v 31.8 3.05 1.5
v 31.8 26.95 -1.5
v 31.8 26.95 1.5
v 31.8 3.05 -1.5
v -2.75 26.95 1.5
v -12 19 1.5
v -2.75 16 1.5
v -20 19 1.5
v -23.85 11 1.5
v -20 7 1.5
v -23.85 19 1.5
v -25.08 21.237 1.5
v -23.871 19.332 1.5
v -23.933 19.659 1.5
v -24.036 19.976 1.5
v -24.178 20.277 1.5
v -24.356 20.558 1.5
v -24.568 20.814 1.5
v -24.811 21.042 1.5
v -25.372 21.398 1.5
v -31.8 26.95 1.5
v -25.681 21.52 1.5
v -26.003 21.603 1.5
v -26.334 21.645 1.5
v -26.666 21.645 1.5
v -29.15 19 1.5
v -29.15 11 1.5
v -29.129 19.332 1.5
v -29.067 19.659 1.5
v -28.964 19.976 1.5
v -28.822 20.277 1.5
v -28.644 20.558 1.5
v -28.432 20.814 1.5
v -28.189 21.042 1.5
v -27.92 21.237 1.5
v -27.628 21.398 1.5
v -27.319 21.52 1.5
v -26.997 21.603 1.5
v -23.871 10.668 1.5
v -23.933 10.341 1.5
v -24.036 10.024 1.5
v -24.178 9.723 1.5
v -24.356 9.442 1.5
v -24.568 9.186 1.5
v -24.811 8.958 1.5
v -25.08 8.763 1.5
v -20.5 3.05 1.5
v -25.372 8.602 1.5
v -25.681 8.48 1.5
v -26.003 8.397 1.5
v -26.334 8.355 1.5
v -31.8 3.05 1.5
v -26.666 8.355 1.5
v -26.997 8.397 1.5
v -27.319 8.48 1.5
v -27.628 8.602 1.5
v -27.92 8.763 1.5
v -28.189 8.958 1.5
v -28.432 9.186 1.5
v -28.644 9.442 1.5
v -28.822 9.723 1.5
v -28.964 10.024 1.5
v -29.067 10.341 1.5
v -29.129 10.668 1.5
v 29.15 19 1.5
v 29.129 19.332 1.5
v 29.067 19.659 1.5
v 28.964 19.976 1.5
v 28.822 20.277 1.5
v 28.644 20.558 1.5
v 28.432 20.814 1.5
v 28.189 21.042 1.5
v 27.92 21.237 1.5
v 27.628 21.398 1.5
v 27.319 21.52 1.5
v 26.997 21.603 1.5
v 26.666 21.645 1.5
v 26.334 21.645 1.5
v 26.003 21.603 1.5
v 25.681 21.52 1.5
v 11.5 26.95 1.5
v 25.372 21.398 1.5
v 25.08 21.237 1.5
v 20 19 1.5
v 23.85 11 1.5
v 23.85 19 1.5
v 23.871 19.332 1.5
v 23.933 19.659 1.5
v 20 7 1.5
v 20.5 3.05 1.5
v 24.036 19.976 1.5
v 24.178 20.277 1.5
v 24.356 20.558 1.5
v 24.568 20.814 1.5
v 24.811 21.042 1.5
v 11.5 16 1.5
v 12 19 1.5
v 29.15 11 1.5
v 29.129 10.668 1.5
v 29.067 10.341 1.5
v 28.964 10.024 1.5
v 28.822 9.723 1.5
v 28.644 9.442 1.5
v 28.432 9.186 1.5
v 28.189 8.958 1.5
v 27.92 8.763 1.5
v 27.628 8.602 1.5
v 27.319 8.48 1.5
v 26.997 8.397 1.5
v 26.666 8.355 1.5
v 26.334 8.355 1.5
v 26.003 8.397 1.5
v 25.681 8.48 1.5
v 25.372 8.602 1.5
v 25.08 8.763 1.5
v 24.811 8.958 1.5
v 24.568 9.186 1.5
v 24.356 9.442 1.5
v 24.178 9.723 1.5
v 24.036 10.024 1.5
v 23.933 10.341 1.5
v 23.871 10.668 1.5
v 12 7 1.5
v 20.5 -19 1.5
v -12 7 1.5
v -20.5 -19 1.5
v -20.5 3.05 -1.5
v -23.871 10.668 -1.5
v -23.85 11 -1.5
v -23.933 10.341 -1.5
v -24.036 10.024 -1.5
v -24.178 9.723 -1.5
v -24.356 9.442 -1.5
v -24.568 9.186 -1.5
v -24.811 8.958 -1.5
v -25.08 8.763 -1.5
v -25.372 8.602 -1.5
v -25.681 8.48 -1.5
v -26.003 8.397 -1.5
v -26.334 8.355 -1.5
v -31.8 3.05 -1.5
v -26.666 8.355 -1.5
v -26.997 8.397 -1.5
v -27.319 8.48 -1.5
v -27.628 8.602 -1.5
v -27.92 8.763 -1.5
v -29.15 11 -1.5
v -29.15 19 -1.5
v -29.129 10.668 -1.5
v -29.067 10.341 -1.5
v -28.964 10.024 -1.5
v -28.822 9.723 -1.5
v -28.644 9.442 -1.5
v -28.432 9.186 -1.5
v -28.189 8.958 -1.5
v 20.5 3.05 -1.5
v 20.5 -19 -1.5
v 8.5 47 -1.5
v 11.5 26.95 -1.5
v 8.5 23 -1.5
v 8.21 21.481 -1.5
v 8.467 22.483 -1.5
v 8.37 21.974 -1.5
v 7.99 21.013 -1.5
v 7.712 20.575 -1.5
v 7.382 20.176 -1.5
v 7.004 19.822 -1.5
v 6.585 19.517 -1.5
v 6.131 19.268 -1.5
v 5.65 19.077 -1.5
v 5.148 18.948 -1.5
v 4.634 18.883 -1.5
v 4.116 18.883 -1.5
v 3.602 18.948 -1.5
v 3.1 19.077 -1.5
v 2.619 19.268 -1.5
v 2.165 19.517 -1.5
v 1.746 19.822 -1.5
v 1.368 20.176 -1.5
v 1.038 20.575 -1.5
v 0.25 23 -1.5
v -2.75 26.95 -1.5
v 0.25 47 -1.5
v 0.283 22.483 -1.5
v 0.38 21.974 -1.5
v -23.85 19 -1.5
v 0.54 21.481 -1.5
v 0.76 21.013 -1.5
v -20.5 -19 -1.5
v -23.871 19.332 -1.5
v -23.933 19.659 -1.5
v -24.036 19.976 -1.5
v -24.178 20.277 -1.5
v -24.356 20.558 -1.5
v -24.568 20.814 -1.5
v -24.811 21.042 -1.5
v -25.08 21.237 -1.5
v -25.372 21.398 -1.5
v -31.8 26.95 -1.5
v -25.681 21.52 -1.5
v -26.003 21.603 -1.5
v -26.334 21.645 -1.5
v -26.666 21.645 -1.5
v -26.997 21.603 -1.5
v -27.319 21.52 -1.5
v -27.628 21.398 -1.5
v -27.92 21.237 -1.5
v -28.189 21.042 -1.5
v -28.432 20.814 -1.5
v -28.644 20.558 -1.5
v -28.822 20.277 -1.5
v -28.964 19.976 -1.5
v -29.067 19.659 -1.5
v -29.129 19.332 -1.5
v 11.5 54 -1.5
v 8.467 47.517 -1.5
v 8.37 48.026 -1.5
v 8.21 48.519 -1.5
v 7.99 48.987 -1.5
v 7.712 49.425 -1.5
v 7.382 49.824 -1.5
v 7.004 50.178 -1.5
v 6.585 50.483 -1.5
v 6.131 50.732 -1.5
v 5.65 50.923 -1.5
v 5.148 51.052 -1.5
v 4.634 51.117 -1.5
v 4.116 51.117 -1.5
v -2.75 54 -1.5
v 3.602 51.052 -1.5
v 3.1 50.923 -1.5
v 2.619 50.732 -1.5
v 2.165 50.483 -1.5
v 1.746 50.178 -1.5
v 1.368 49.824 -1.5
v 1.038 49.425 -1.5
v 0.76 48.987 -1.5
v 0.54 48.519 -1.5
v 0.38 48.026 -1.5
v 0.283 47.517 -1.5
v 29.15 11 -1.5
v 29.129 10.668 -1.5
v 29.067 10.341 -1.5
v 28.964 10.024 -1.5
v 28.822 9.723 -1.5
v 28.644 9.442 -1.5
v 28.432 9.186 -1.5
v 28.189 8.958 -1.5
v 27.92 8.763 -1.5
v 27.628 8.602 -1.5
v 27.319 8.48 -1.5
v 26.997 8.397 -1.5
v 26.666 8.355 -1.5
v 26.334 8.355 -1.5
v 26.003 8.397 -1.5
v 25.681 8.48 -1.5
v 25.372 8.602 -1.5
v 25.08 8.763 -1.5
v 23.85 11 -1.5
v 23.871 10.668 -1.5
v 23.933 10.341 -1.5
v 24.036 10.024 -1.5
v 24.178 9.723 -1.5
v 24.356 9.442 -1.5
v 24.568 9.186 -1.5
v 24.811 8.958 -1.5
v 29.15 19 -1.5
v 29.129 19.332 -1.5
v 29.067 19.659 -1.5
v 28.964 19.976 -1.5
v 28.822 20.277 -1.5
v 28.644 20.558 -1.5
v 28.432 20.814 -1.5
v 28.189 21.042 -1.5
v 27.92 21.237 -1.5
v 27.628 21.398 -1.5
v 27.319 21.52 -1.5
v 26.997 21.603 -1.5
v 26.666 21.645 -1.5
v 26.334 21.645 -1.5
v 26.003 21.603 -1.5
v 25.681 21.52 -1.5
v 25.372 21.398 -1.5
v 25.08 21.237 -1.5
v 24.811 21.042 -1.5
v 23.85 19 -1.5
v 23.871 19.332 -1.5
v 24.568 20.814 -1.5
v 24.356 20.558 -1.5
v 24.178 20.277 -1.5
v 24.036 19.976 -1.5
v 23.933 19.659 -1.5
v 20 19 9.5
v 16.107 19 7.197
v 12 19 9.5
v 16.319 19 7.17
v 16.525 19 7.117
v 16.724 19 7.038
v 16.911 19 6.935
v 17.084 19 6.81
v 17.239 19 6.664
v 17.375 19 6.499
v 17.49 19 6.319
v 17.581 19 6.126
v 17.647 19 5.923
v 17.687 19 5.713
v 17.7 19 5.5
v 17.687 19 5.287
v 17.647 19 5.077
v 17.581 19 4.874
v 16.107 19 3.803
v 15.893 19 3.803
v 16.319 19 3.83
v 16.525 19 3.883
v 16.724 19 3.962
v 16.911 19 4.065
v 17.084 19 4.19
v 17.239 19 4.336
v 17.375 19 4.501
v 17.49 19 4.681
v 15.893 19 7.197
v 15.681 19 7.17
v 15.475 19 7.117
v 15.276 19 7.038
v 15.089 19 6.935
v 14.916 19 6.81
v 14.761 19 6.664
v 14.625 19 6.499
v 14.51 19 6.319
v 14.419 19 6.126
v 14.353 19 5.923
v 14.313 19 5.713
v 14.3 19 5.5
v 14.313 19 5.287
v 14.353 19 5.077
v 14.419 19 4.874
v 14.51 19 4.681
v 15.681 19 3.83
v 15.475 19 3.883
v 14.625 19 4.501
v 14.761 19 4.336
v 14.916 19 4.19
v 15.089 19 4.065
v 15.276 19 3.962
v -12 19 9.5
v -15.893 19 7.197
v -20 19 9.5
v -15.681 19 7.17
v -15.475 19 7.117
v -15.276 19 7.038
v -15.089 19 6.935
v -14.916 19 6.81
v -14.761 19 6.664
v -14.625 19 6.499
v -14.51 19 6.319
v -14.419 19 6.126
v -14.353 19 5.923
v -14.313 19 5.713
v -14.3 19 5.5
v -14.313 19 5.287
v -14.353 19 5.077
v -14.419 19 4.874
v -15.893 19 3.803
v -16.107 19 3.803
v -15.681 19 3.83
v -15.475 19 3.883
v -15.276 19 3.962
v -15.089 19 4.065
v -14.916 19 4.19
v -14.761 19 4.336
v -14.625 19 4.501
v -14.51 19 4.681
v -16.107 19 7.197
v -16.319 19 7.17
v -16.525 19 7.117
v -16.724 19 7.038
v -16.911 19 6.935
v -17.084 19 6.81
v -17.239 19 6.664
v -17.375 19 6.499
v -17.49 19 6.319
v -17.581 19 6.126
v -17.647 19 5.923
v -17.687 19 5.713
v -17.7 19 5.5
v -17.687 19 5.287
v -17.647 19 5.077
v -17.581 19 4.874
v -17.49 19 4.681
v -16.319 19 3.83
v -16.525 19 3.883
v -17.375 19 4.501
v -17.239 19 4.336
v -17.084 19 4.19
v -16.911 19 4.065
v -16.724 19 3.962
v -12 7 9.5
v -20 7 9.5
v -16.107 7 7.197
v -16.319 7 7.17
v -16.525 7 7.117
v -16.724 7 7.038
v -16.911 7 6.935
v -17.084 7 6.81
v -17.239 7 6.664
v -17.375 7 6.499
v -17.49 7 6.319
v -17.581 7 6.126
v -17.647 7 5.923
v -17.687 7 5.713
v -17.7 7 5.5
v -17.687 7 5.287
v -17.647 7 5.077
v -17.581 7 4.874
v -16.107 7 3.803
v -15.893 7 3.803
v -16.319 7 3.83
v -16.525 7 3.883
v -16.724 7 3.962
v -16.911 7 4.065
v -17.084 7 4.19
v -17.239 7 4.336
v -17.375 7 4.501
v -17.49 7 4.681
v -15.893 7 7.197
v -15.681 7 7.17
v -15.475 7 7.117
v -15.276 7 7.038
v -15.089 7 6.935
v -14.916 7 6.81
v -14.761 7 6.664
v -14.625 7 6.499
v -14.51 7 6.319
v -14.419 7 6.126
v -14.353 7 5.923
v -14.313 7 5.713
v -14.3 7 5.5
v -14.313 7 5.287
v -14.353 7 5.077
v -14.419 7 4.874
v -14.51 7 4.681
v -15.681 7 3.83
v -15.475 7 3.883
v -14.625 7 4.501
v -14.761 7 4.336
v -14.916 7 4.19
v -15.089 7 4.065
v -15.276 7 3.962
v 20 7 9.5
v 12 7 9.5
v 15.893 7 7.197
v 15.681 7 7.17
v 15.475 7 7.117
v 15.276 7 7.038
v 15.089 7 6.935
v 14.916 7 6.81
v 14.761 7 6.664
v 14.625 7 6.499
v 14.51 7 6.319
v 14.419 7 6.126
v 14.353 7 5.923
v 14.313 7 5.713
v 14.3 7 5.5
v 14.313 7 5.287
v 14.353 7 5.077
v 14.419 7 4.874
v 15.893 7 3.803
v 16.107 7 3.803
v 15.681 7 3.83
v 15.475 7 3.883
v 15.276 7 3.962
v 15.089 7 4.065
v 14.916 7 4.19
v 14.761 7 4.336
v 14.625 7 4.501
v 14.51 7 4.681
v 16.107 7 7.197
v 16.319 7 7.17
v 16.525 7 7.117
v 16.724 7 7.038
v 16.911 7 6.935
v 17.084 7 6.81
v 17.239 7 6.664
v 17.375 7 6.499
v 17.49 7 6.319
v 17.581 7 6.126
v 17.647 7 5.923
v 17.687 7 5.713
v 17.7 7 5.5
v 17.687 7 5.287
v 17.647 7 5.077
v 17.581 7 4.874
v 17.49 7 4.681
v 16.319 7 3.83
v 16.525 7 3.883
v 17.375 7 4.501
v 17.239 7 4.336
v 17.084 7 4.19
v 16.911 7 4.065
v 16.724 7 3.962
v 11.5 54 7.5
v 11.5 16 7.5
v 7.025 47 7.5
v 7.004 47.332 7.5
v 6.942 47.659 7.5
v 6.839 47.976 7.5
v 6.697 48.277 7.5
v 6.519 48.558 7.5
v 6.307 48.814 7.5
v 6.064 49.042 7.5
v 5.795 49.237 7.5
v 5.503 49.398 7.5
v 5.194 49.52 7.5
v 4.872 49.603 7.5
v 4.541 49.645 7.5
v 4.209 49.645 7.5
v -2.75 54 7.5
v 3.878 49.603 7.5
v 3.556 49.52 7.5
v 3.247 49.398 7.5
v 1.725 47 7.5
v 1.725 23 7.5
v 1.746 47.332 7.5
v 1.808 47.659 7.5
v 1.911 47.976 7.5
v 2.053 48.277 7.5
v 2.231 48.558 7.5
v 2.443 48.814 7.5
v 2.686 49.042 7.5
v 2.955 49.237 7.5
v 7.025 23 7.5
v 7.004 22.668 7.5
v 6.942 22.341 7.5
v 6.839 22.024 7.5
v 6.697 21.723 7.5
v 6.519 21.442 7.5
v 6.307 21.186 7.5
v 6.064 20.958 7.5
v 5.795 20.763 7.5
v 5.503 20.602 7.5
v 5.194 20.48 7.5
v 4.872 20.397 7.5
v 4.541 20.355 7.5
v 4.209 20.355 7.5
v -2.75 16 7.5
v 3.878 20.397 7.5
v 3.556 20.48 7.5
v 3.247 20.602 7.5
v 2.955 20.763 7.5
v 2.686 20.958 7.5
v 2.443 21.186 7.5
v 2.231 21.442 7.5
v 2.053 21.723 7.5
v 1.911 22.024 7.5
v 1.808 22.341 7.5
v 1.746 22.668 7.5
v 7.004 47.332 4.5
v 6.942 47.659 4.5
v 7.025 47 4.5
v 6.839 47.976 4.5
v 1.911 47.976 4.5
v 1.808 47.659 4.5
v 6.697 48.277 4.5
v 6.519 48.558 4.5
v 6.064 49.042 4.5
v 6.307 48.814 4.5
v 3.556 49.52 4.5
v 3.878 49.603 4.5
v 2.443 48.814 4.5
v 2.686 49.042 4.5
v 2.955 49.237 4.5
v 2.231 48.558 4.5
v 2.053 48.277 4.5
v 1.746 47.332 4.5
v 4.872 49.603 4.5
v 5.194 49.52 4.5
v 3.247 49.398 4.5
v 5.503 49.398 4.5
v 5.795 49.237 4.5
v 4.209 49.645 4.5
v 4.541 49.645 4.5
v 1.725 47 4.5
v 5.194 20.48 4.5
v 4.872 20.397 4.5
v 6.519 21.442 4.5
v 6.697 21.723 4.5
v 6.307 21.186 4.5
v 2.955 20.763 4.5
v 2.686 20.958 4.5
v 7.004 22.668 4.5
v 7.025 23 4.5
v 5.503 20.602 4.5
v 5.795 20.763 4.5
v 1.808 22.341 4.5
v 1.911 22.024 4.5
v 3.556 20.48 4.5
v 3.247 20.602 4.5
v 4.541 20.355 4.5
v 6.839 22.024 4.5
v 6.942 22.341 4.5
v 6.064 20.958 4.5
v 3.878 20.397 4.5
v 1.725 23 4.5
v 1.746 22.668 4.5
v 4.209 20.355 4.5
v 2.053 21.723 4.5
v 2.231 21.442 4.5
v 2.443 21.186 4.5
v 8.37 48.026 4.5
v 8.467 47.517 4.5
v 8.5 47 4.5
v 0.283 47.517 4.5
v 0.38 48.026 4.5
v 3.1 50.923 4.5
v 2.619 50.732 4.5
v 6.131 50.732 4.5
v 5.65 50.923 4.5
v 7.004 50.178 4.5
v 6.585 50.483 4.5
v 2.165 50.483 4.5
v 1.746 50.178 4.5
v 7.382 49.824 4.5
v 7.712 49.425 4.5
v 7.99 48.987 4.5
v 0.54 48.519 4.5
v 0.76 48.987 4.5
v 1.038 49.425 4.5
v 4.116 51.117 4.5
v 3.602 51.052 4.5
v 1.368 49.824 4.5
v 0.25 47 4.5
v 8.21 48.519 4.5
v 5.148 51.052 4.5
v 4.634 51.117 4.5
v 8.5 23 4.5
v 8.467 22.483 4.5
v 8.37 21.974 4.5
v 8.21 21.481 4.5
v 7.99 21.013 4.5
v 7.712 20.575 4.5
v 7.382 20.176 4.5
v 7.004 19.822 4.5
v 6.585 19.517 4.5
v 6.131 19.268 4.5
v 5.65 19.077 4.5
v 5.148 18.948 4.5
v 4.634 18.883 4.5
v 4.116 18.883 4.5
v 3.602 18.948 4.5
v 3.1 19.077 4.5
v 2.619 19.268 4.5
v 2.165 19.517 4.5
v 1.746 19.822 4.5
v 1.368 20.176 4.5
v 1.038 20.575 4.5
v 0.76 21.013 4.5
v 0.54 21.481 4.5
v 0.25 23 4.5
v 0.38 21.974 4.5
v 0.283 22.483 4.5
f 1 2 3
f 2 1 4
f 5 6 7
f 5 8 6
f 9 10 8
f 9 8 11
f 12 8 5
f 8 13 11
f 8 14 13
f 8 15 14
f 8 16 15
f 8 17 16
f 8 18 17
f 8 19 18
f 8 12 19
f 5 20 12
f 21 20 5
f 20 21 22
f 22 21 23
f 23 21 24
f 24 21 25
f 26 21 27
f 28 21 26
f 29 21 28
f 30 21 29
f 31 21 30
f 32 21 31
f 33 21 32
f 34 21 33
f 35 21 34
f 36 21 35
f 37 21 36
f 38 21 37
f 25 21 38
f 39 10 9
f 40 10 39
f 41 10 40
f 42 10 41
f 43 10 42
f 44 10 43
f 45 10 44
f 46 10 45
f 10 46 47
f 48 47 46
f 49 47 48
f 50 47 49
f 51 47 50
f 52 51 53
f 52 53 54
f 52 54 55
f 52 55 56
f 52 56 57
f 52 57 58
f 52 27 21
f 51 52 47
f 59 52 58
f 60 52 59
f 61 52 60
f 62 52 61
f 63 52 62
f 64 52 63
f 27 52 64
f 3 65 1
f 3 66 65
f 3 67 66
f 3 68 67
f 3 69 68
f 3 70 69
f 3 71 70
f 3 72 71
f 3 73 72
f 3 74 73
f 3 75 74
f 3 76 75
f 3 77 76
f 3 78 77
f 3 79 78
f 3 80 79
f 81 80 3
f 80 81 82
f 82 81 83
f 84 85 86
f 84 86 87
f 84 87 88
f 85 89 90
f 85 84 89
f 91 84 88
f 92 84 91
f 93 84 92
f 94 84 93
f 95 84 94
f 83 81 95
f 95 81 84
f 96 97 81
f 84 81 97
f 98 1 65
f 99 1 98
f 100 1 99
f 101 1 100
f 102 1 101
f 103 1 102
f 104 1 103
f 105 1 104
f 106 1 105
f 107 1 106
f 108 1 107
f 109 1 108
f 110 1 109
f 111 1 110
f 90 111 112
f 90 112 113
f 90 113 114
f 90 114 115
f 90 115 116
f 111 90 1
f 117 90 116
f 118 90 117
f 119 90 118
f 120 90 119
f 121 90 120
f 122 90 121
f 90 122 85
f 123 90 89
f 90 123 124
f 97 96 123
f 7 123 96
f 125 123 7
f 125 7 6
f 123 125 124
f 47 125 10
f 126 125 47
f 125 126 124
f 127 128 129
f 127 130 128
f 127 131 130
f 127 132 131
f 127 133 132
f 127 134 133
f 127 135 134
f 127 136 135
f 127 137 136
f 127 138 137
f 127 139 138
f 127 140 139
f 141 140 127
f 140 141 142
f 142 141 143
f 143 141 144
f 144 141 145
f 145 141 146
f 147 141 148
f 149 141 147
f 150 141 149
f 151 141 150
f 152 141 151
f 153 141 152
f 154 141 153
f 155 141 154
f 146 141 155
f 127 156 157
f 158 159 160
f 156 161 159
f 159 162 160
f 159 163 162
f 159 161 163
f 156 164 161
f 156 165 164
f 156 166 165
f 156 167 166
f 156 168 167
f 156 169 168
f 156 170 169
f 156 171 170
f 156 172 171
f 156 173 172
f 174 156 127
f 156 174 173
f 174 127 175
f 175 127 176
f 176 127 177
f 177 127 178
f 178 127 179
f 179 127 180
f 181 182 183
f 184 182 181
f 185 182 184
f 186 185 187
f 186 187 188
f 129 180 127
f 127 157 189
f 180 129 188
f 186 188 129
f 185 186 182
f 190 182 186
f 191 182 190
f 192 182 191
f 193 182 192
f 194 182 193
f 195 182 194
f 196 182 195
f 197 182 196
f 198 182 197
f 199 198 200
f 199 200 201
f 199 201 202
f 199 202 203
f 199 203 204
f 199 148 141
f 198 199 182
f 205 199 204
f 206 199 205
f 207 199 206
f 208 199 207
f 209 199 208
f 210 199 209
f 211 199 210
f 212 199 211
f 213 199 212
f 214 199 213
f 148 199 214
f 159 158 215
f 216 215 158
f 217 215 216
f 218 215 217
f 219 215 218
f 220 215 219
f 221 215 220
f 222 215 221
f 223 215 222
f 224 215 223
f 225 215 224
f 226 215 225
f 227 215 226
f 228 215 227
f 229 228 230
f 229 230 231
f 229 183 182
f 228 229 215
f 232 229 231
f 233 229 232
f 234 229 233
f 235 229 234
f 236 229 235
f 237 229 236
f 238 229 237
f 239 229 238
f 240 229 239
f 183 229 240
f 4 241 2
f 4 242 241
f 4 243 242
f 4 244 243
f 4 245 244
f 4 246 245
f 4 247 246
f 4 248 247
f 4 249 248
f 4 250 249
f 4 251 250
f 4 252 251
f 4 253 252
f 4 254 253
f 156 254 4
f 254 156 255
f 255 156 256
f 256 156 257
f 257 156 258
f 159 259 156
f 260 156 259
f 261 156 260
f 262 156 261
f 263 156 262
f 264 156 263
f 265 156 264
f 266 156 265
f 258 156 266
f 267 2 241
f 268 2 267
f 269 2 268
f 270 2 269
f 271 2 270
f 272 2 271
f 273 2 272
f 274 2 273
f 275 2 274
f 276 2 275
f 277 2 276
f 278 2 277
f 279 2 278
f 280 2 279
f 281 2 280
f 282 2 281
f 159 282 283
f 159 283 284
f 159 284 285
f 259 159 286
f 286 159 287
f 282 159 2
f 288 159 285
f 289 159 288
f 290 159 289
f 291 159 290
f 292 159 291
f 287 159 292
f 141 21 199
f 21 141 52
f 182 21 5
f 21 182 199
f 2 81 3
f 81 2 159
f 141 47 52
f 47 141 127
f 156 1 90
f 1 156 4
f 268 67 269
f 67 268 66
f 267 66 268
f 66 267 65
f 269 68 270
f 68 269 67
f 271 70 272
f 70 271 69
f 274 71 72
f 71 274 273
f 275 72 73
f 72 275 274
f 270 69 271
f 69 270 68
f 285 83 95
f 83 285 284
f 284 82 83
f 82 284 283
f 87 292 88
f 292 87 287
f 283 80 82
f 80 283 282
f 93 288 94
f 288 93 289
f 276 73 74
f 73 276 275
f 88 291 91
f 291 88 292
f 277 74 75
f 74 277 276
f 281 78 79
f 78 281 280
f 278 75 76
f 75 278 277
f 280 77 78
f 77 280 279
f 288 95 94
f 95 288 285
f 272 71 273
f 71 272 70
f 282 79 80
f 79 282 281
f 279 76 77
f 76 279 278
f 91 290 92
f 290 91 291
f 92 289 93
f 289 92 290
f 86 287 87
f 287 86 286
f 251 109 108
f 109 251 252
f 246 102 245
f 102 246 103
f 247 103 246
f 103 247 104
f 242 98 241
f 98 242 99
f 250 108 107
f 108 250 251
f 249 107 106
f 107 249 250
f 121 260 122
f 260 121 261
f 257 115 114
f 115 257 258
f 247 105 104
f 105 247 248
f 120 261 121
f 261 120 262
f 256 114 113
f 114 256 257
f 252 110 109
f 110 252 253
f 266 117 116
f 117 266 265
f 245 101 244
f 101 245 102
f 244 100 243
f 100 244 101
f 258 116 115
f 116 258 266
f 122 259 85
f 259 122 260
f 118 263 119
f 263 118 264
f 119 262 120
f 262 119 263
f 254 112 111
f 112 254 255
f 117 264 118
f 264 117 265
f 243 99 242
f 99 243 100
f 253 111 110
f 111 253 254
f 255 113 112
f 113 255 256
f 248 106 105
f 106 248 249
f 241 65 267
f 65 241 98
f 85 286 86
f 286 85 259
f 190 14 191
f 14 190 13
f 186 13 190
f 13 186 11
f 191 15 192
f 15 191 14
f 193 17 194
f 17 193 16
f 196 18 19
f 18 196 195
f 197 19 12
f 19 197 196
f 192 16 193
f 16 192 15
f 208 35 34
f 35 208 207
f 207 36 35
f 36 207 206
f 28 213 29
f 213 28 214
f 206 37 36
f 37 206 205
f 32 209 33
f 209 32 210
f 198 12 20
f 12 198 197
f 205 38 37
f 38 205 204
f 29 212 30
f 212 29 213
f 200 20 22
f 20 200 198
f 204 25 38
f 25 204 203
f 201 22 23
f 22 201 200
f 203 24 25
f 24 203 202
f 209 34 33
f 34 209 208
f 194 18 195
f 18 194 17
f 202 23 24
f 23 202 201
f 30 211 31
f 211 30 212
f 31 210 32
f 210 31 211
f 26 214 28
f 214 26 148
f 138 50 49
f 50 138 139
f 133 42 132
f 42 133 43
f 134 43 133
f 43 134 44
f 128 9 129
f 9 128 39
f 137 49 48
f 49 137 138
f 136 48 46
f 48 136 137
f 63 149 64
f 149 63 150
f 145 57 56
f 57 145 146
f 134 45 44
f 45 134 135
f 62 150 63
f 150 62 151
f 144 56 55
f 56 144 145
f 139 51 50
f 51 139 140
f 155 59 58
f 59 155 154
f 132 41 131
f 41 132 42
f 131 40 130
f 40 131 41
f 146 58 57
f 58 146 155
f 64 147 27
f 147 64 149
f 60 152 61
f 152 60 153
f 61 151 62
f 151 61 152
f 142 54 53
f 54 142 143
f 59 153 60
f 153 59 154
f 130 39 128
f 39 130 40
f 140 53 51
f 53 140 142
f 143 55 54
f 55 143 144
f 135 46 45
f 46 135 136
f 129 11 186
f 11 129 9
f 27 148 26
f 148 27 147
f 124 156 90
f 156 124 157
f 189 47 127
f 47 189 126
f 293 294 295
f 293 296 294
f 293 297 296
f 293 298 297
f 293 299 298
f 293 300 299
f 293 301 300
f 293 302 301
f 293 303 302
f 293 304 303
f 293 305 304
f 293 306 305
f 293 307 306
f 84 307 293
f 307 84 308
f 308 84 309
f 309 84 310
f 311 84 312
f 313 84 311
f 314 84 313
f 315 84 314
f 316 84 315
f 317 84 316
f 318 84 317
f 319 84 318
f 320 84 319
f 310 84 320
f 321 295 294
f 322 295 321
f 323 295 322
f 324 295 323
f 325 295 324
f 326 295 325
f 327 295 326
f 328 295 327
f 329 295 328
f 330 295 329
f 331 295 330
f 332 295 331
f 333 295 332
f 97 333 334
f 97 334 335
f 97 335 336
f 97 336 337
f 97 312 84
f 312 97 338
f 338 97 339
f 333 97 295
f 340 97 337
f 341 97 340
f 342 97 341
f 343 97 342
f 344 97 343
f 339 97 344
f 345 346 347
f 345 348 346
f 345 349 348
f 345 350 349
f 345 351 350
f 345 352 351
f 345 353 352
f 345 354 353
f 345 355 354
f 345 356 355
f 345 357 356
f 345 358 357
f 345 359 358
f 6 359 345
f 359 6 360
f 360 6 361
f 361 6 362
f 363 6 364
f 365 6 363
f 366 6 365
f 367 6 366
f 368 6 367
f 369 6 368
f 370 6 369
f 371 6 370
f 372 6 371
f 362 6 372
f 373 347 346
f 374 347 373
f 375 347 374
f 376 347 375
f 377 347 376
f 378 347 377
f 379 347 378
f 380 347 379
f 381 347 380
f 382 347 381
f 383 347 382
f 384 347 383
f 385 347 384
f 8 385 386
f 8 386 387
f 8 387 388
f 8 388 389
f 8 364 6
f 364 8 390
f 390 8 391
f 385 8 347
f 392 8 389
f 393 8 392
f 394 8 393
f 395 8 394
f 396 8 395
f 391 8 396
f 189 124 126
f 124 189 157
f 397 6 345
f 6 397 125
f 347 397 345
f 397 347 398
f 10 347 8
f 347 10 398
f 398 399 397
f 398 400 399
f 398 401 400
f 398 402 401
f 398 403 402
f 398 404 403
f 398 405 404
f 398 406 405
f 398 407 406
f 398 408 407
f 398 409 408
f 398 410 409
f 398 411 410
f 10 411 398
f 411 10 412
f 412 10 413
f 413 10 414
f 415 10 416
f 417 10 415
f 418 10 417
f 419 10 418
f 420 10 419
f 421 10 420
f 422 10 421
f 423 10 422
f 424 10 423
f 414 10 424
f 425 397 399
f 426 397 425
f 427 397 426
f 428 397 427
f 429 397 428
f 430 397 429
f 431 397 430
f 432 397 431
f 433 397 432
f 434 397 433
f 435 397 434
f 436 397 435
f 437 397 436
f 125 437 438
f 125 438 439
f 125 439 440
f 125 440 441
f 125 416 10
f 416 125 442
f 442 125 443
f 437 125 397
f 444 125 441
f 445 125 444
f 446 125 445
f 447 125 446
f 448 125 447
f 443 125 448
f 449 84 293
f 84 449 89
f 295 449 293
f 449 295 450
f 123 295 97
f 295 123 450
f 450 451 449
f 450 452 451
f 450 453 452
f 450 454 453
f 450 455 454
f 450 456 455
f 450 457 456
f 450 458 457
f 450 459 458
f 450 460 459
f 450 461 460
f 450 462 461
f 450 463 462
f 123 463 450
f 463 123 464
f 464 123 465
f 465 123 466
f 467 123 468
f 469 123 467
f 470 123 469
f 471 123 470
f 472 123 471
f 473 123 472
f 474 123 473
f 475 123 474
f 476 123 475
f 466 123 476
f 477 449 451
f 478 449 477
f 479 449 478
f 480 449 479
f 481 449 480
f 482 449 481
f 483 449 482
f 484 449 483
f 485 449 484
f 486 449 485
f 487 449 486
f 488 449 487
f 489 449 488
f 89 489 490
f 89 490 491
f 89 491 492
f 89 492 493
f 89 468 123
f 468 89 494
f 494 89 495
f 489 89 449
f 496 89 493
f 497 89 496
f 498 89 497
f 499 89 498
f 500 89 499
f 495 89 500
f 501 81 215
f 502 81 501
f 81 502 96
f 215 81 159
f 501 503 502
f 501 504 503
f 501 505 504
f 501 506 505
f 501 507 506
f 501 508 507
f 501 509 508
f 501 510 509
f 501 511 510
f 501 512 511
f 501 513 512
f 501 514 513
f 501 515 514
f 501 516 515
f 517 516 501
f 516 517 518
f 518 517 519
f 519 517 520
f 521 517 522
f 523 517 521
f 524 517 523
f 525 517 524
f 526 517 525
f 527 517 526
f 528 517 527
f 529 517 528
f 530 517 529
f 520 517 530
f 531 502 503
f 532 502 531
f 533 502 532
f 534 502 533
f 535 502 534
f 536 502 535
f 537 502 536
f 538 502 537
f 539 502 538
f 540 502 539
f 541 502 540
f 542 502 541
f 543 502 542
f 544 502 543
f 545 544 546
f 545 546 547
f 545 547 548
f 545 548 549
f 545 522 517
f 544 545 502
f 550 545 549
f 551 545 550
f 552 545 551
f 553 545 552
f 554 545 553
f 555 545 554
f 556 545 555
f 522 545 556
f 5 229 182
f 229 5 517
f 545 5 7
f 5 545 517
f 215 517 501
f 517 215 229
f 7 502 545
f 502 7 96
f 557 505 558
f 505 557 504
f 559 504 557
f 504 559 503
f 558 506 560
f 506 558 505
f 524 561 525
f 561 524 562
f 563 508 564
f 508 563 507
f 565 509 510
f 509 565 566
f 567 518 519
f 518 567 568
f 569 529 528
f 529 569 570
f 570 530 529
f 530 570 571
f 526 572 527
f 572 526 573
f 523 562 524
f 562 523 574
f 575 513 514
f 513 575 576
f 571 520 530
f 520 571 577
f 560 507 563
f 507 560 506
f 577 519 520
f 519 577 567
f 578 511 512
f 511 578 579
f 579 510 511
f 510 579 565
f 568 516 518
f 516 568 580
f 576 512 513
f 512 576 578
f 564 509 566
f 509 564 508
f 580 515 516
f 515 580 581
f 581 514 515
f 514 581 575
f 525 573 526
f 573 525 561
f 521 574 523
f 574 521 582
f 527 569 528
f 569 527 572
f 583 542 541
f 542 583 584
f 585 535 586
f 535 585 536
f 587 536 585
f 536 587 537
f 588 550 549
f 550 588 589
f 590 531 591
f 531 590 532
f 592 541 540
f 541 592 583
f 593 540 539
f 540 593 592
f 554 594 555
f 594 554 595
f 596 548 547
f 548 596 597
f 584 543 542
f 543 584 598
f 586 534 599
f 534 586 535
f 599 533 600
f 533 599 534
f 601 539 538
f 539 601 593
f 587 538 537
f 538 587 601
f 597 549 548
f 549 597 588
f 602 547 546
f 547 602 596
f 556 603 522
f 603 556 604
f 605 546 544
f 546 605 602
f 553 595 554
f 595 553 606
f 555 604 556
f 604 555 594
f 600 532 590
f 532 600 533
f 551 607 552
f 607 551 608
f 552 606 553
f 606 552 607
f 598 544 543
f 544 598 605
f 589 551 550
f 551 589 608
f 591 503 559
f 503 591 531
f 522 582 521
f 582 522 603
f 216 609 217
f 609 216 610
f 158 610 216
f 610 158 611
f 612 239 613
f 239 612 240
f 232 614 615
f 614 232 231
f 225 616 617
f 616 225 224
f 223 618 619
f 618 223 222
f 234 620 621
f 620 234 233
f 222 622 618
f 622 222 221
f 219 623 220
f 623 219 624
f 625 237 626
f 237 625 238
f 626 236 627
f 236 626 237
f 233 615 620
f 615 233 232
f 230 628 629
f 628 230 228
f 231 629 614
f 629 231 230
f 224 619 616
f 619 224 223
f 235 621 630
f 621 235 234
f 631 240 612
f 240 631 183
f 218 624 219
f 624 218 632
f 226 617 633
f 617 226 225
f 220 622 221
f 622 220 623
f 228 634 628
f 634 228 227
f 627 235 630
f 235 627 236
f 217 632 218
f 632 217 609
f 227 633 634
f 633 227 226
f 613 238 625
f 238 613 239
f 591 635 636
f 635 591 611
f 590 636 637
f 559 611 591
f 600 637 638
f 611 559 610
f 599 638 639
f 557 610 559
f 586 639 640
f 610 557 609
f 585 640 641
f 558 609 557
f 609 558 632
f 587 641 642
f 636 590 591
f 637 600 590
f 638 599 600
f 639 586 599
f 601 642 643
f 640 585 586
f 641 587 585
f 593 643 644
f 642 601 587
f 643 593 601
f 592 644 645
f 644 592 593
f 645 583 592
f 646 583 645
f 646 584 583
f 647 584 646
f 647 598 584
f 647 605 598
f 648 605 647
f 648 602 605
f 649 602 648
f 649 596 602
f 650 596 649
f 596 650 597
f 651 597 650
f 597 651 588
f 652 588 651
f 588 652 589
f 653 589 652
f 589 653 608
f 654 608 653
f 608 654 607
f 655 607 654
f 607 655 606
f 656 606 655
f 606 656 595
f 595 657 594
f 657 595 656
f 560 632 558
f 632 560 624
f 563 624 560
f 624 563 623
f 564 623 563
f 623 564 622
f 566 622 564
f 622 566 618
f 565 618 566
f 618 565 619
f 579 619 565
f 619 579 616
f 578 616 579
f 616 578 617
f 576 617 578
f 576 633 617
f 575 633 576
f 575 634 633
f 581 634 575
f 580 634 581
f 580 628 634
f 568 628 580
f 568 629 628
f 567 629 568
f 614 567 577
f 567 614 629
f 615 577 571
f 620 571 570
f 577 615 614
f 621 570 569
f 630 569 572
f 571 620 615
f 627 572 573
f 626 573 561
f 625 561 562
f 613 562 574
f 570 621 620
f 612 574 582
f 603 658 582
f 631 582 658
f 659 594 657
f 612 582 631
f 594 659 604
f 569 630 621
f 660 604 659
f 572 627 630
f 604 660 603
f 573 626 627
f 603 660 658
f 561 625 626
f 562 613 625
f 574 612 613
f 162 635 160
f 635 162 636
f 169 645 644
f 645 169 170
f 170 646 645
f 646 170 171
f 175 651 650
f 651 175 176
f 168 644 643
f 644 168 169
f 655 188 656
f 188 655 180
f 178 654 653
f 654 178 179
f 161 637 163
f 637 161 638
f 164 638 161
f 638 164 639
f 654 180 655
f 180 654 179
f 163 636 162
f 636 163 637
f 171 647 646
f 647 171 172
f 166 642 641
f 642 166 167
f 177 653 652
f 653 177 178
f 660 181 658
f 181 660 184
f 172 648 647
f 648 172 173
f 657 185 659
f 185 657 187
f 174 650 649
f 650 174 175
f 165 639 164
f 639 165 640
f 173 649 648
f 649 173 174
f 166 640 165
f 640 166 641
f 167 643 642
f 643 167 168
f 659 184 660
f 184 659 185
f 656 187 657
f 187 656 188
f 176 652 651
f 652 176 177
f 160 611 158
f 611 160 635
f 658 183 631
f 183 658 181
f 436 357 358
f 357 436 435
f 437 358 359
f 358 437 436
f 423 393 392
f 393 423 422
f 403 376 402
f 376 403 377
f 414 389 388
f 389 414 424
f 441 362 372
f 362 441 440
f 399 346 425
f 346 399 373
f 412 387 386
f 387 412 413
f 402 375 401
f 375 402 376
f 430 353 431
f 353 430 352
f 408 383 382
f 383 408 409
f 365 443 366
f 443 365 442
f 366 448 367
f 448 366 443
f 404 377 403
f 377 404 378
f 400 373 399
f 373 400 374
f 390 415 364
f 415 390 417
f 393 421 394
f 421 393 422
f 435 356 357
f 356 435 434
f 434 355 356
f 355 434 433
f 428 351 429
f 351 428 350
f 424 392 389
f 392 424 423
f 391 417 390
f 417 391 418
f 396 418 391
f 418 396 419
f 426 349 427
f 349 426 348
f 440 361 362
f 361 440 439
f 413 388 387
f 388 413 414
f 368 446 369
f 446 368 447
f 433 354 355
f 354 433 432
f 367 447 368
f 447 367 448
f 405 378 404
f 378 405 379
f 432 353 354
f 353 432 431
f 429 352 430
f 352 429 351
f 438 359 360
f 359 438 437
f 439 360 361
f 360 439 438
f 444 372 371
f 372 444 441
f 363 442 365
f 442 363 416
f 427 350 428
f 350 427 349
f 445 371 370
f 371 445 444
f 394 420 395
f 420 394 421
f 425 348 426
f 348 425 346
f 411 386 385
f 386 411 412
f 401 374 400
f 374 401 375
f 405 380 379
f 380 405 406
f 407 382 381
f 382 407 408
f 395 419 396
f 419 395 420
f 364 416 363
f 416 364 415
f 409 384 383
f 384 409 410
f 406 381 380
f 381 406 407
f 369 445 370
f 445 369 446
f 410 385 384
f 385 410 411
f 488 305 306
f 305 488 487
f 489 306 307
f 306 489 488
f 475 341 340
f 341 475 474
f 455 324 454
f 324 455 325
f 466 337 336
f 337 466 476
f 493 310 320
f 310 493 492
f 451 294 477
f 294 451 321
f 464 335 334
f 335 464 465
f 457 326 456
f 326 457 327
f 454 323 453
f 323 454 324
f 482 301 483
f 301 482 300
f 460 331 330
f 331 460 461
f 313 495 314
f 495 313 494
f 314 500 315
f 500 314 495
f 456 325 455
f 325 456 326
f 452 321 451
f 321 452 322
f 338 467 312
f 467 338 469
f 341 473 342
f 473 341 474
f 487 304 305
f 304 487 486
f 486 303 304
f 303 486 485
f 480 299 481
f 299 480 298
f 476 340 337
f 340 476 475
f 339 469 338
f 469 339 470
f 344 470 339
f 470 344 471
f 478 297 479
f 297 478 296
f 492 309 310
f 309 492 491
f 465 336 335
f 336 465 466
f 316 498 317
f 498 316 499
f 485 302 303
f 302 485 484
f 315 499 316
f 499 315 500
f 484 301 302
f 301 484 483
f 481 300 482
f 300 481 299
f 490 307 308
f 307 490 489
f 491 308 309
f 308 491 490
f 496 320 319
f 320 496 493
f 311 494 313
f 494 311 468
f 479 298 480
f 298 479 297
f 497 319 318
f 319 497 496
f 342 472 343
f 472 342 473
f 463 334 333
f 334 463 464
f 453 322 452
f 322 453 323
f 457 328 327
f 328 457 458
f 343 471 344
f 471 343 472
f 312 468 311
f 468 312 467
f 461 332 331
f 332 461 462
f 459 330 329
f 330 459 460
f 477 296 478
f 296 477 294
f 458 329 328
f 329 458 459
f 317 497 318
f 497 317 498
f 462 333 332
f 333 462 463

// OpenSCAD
// meter plate

meter_x = 41;
meter_y = 26;

screw_square = 32;
m3_block_y = 12;
m3_block_x = 8;
m3_block_z = 8;

m3_dia = 3.0;
m3_washer_dia = 9;

plate_thickness = 3;

plate_z = plate_thickness;
plate_y = meter_y + m3_block_y;
plate_x = meter_x;

echo ("plate_x:", plate_x);
echo ("plate_y:", plate_y);

mount_centerline = 53;
mount_slot = 8;

m5_pilot = 4.2;
m5_dia = 5.3;

mplate_x = mount_centerline + 2 * m5_dia;
mplate_y = m5_dia + mount_slot + 2 * m5_dia;
mplate_z = plate_thickness;
echo ("mplate_y:", mplate_y);

// meter 2
slot_width = 8.25;
slot_depth = 6;
slot_wall = 3;

meter2_block_x = slot_width + slot_wall * 2;
meter2_block_y = 38;
meter2_block_z = 6 + slot_wall;
meter2_slot = 24;

meter2_trans_x = screw_square/2 - meter2_block_x/2 - m3_washer_dia/2;
meter2_trans_y = 35;
        
$fn = 50;

difference () {
    union () {
        
        cube ([plate_x, plate_y, plate_thickness], center = true);
        
        // mouting blocks
        translate([-(screw_square/2),
            plate_y/2 - m3_block_y/2,
            plate_thickness/2 + m3_block_z/2])
        cube([m3_block_x, m3_block_y, m3_block_z], center = true);
        
        translate([(screw_square/2),
            plate_y/2 - m3_block_y/2,
            plate_thickness/2 + m3_block_z/2])
        cube([m3_block_x, m3_block_y, m3_block_z], center = true);
        
        // mount plate
        meter_extend = 4;
        centerline_from_edge = 30;
        mount_plate_centerline = -(plate_y/2 - meter_extend - 30);
        echo("mount_plate_centerline:", mount_plate_centerline);
        
        translate([0, mount_plate_centerline, 0])
        difference () {
            cube([mplate_x, mplate_y, mplate_z], center = true);
            // substract 
            {
                // +x
                translate([mount_centerline/2, mount_slot/2, 0])
                cylinder(r = m5_dia/2, h = mplate_z, center = true);
                
                translate([mount_centerline/2, -mount_slot/2, 0])
                cylinder(r = m5_dia/2, h = mplate_z, center = true);

                translate([mount_centerline/2, 0, 0])
                cube([m5_dia, mount_slot, mplate_z], center = true);
                // -x
                translate([-mount_centerline/2, mount_slot/2, 0])
                cylinder(r = m5_dia/2, h = mplate_z, center = true);
                
                translate([-mount_centerline/2, -mount_slot/2, 0])
                cylinder(r = m5_dia/2, h = mplate_z, center = true);
                
                translate([-mount_centerline/2, 0, 0])
                cube([m5_dia, mount_slot, mplate_z], center = true);
            }
        }
        
        // meter 2 block

        translate([meter2_trans_x,
            meter2_trans_y,
            -(plate_thickness/2 - meter2_block_z/2)])
        cube([meter2_block_x, meter2_block_y, meter2_block_z], center = true);
    }

    // subtract 
    {
        translate([-(screw_square/2),
            plate_y/2 - m3_block_y/2,
            plate_thickness/2 + m3_block_z/2])
        rotate([90,0,0])
        cylinder(r = (m3_dia + 0.4)/2, h = m3_block_y, center = true);
        
        translate([(screw_square/2),
            plate_y/2 - m3_block_y/2,
            plate_thickness/2 + m3_block_z/2])
        rotate([90,0,0])
        cylinder(r = (m3_dia + 0.4)/2, h = m3_block_y, center = true);
        
        // meter2 slot
        translate([meter2_trans_x,
            meter2_trans_y,
            -(plate_thickness/2 - meter2_block_z/2)])
            {   
                // minor slot
                translate([0, meter2_slot/2, 0])
                cylinder(r = m5_dia/2, h = meter2_block_z, center = true);

                translate([0, -meter2_slot/2, 0])
                cylinder(r = m5_dia/2, h = meter2_block_z, center = true);  

                translate([0, 0, 0])
                cube([m5_dia, meter2_slot, meter2_block_z], center = true); 
                
                // major slot
                translate([0, meter2_slot/2, -(meter2_block_z/2 - slot_depth/2)])
                cylinder(r = slot_width/2, h = slot_depth, center = true);
                
                translate([0, -meter2_slot/2, -(meter2_block_z/2 - slot_depth/2)])
                cylinder(r = slot_width/2, h = slot_depth, center = true);
                
                translate([0,0, -(meter2_block_z/2 - slot_depth/2)])
                cube([slot_width, meter2_slot, slot_depth], center = true);
            }
        
    }
}
